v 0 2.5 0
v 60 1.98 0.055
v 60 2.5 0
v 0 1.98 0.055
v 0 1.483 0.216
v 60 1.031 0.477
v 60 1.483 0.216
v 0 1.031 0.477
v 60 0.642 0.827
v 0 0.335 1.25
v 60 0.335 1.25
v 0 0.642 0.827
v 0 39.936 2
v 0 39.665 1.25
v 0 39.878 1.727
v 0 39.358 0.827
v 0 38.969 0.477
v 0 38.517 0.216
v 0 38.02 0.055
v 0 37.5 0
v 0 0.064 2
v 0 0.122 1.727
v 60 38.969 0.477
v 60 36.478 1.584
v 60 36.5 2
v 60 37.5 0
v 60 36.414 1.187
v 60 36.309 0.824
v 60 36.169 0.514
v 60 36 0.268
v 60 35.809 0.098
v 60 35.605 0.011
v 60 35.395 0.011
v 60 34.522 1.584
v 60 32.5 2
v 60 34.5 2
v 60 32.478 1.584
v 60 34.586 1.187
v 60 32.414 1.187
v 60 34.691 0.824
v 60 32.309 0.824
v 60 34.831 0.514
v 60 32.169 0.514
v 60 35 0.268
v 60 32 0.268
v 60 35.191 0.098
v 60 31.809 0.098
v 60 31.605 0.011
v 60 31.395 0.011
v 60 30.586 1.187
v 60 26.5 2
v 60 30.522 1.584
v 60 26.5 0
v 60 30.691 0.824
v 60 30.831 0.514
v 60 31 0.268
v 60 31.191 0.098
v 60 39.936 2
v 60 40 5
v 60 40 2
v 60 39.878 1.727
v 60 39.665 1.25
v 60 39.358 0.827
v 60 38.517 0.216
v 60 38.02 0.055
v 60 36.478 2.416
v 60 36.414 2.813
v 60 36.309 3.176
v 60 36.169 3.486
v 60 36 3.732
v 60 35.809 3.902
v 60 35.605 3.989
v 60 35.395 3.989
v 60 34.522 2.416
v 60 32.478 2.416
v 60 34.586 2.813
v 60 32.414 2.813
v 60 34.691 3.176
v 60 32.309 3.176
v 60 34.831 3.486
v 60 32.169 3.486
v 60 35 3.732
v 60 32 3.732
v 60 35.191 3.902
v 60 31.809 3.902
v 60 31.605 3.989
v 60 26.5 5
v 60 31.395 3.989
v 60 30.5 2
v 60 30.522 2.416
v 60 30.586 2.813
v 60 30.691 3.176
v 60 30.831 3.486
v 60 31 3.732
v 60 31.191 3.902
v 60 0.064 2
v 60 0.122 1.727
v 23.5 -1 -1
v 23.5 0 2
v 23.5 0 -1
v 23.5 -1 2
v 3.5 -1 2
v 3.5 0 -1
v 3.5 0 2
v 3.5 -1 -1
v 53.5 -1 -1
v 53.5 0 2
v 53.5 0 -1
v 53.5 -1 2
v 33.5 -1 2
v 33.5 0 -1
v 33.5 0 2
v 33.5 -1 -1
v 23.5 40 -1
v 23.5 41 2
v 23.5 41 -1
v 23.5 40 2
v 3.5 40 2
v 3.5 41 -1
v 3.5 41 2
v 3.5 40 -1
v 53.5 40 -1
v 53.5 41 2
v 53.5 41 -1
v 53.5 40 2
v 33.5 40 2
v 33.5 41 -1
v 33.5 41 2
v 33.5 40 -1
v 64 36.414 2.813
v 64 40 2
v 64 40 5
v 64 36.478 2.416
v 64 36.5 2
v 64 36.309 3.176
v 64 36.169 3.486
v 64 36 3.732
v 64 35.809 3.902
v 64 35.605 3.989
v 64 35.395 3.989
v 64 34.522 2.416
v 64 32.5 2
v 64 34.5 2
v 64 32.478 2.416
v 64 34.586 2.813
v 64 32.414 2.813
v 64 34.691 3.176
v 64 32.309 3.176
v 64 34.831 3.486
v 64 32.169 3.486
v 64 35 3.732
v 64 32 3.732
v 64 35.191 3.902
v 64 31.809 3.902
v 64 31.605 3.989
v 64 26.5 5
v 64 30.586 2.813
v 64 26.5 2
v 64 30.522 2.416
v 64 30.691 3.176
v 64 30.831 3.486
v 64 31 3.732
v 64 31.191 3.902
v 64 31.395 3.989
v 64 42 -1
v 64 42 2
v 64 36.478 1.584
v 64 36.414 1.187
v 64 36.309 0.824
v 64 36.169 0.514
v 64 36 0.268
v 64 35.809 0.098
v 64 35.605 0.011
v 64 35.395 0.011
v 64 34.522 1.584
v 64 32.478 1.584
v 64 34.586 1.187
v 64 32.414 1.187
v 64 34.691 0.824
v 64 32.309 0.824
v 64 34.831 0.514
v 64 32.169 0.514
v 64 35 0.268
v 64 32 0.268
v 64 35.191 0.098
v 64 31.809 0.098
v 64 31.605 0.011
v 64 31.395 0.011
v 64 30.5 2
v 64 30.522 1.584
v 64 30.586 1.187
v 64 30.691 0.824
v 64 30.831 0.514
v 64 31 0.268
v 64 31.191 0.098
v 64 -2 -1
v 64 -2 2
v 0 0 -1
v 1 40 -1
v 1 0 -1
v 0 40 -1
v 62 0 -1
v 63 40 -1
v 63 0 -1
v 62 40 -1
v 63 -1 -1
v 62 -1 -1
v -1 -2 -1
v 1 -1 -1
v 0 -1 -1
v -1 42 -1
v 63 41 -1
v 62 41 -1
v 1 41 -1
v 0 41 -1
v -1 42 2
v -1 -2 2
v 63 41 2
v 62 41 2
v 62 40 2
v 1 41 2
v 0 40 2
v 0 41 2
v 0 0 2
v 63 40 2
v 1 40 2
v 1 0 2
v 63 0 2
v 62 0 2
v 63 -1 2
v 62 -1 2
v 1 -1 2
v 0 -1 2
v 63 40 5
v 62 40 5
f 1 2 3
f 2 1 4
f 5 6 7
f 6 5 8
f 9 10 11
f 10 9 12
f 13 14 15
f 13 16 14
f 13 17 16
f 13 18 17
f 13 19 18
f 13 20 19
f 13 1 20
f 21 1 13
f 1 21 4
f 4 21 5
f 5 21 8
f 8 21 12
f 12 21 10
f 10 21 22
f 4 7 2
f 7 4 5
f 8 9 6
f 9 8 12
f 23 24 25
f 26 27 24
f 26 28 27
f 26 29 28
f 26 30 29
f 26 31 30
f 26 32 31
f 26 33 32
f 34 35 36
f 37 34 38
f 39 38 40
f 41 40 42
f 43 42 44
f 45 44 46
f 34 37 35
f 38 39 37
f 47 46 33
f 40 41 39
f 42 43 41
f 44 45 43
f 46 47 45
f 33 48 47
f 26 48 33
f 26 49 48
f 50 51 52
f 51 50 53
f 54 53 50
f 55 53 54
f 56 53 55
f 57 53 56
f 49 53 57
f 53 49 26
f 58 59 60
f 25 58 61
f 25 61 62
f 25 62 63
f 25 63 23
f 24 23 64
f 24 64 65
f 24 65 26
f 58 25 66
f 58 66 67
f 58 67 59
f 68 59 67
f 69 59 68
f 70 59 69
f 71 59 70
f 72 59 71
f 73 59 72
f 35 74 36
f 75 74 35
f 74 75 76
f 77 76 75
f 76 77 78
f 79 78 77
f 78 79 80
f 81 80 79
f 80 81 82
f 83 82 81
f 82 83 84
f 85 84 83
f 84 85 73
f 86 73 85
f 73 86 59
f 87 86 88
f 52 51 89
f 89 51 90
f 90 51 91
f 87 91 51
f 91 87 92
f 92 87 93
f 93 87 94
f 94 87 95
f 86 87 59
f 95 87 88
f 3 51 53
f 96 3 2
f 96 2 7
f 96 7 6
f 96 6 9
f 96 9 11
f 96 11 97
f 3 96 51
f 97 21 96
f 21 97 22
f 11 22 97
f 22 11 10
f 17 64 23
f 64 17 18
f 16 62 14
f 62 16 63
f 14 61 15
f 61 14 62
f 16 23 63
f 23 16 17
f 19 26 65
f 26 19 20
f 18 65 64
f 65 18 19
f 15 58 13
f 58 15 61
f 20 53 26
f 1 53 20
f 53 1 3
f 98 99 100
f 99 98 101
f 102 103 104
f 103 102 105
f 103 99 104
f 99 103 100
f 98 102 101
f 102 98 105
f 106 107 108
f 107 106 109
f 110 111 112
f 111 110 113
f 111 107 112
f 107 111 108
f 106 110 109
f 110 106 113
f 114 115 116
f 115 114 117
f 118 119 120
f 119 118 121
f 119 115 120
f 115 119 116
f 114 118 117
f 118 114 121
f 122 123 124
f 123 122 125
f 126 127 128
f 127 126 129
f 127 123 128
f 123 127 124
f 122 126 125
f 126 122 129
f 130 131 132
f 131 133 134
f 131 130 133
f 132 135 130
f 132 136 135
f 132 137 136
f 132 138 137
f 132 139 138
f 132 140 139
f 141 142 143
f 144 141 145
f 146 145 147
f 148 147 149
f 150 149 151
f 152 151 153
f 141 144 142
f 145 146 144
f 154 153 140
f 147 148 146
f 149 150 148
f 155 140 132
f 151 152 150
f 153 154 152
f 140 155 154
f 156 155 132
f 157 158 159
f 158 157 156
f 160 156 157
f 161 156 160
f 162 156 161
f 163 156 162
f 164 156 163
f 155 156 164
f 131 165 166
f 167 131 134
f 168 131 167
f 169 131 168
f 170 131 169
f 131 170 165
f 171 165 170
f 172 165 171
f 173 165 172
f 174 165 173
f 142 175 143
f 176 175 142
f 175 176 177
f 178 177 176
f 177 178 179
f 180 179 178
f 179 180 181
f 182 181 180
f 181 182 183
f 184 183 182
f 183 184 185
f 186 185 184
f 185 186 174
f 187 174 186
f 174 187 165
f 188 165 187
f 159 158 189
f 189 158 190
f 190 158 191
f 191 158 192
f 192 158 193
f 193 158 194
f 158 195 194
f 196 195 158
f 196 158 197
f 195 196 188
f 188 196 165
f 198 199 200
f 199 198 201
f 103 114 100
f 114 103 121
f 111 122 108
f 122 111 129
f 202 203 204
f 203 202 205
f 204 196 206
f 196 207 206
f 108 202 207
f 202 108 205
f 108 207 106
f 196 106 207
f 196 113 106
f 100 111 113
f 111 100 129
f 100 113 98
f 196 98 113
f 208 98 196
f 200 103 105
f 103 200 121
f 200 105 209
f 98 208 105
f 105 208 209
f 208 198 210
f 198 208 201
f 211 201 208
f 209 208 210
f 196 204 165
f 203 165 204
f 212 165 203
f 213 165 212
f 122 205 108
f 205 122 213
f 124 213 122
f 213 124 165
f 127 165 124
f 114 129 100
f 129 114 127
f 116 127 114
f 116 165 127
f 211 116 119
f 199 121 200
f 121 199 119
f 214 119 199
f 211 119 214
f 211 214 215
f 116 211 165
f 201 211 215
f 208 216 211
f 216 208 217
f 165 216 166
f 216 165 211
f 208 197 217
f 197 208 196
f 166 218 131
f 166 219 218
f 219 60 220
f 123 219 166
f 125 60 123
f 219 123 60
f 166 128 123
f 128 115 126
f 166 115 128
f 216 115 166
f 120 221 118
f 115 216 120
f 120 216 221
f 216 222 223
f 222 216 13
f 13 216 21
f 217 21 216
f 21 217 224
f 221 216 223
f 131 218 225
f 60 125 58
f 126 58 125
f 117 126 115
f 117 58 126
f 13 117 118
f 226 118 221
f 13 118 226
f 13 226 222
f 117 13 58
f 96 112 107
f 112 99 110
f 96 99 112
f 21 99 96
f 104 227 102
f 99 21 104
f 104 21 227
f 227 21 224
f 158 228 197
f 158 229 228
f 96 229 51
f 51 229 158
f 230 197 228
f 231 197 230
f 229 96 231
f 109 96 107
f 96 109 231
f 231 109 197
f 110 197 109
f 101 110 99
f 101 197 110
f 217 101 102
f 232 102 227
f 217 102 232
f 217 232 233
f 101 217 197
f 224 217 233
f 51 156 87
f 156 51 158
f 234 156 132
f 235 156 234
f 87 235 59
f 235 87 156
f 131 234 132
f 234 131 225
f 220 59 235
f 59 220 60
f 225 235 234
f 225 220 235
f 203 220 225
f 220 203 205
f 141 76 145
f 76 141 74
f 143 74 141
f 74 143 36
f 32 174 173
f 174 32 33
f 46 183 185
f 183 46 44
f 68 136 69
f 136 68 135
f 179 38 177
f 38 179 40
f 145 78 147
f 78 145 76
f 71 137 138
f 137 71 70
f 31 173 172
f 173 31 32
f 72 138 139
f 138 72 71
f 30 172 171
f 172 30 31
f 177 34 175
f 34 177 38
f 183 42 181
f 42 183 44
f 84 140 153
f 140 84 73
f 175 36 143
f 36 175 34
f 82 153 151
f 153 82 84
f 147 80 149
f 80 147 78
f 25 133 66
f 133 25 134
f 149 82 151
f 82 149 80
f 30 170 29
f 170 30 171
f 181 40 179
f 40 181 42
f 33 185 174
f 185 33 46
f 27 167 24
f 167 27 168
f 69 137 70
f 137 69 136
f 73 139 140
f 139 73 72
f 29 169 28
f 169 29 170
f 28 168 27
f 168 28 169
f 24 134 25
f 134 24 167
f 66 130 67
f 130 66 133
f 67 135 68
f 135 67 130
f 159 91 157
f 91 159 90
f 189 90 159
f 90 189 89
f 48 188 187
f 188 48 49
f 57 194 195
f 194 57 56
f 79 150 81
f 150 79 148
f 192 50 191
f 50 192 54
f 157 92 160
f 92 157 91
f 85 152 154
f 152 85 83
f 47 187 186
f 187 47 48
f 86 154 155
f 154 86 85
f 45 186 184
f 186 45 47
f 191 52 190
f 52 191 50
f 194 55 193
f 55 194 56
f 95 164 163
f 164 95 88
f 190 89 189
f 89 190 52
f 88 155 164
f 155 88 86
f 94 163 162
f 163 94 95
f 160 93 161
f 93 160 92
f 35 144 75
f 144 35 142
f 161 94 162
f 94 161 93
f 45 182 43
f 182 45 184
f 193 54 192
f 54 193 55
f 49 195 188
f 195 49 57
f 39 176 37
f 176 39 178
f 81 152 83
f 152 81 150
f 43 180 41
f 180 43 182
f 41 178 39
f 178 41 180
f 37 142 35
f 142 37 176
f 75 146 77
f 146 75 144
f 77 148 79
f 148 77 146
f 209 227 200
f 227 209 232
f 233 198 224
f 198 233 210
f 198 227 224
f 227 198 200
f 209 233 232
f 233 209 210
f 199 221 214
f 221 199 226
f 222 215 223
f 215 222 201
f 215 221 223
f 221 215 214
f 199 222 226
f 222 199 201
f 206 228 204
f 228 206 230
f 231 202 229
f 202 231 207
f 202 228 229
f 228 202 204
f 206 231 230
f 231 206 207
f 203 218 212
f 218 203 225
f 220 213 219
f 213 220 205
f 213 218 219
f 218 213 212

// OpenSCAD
emptyW=38+2;
emptyH=60;
emptyD=5;

wall=1;
thickWall=wall * 2;
cut=2;

caseW=emptyW + wall * 4;
caseH=emptyH + wall * 2;
caseHExtra=3;
caseD=emptyD + wall * 2;

// extra block for pins
blockH=caseHExtra + wall;
blockW=13.5;
blockD=5;
blockSledgeMultiplier=3;
blockSledge2Multiplier=1.5;

// velcro
holderGap=20;
holderHeight=2 * wall;
holderWall=wall * 1.5;
holderWidth=holderGap + holderWall * 2;

pinLength=6;
pinTurnLength=6;
pinWidth=1;
pinDepth=5;

difference() {
    union() {
	difference() {
	    translate([(emptyH - caseH) / 2, (emptyW - caseW) / 2, (emptyD - caseD) / 2]) { // case
		cube([caseH + caseHExtra, caseW, caseD]); }    
	    union() { // hole for the battery
		translate([0, emptyD / 2, emptyD / 2]) rotate([0, 90]) {
		    cylinder(h=60, r=emptyD / 2, $fn=30); }
		translate([0, emptyW - emptyD / 2, emptyD / 2]) rotate([0, 90]) {
		    cylinder(h=60, r=emptyD / 2, $fn=30); }
		translate([0, emptyD / 2]) {
		    cube([emptyH, emptyW - emptyD, emptyD]); }
	    }

	    // holes for velcro
	    translate([0, -wall, cut - holderHeight / 2]) {
		translate([emptyH / 4 - holderWidth / 2, 0, -250]) cube([holderGap, wall, 500]);
		translate([emptyH / 4 * 3 - holderWidth / 2, 0, -250]) cube([holderGap, wall, 500]);
	    }
	    translate([0, emptyW, cut - holderHeight / 2]) {
		translate([emptyH / 4 - holderWidth / 2, 0, -250]) cube([holderGap, wall, 500]);
		translate([emptyH / 4 * 3 - holderWidth / 2, 0, -250]) cube([holderGap, wall, 500]);
	    }
	    
	    translate([-50, -50, cut]) cube([300, 300, 300]); // cut top
	}

        // block for wires
	translate([emptyH, emptyW]) rotate([0, 0, -90]) {
	    translate([0, 0]) difference() {
		cube([blockW, blockH, blockD]); }}
        
        
/*
	// block for wires
	translate([emptyH, emptyW]) rotate([0, 0, -90]) {
	    translate([-wall * 2, 0]) difference() {
		cube([blockW, blockH, blockD]);
		// space for soldering
		translate([3, 2]) {
		    cube([4, 50, 50]); }
		translate([10, 2]) {
		    cube([4, 50, 50]); }
	    }

	    // sledges // TODO change to MCAD triangles
	    translate([blockW-wall * 2 + blockD / 2 / sqrt(3) *  blockSledgeMultiplier, 0, wall * 2]) rotate([-90, 0]) {
		scale([blockSledgeMultiplier, 1, 1]) cylinder(h=wall + caseHExtra, r=blockD / sqrt(3), $fn=3); }
	    translate([-wall * 2, -blockD / 2 / sqrt(3) *  blockSledge2Multiplier, wall * 2]) rotate([-90, 0, -90]) {
		scale([blockSledge2Multiplier, 1, 1]) cylinder(h=wall * 2, r=blockD / sqrt(3), $fn=3); }
	} */
    }

    // holes for wires
    translate([emptyH, emptyW]) rotate([0, 0, -90]) {
        translate([4.5, 0, 2]) {
            rotate([90, 0, 0]) {
                scale([1, 2, 1]) {
                    cylinder(h=15, r=1, $fn=30, center=true); }}}
	translate([8.5, -3, 2]) {
            rotate([90, 0, 0]) {
                scale([1, 2, 1]) {
                    cylinder(h=15, r=1, $fn=30, center=true); }}}}
    

    /*
    // space for pins
    translate([emptyH, emptyW]) rotate([0, 0, -90]) {
	translate([4, -3, -0.5]) {
	    cube([pinWidth, pinLength, pinDepth]);
	    translate([-pinTurnLength + pinWidth, pinLength - pinWidth, 0]) {
		cube([pinTurnLength, pinWidth, pinDepth]); }
	}
	translate([8, -3, -0.5]) {
	    cube([pinWidth, pinLength, pinDepth]);
	    translate([0, pinLength - pinWidth, 0]) {
		cube([pinTurnLength, pinWidth, pinDepth]); }
	}
    }*/

    // extra holes
    for(i = [ [ 0,  -wall,  -25],
              [0, emptyW, -25],
              [caseH + caseHExtra - 3 * wall, -wall, -25],
              [caseH + caseHExtra - 3 * wall, emptyW, -25] ]) {
	translate(i) {
		     cube([1, 1, 50]); }
    }
}
